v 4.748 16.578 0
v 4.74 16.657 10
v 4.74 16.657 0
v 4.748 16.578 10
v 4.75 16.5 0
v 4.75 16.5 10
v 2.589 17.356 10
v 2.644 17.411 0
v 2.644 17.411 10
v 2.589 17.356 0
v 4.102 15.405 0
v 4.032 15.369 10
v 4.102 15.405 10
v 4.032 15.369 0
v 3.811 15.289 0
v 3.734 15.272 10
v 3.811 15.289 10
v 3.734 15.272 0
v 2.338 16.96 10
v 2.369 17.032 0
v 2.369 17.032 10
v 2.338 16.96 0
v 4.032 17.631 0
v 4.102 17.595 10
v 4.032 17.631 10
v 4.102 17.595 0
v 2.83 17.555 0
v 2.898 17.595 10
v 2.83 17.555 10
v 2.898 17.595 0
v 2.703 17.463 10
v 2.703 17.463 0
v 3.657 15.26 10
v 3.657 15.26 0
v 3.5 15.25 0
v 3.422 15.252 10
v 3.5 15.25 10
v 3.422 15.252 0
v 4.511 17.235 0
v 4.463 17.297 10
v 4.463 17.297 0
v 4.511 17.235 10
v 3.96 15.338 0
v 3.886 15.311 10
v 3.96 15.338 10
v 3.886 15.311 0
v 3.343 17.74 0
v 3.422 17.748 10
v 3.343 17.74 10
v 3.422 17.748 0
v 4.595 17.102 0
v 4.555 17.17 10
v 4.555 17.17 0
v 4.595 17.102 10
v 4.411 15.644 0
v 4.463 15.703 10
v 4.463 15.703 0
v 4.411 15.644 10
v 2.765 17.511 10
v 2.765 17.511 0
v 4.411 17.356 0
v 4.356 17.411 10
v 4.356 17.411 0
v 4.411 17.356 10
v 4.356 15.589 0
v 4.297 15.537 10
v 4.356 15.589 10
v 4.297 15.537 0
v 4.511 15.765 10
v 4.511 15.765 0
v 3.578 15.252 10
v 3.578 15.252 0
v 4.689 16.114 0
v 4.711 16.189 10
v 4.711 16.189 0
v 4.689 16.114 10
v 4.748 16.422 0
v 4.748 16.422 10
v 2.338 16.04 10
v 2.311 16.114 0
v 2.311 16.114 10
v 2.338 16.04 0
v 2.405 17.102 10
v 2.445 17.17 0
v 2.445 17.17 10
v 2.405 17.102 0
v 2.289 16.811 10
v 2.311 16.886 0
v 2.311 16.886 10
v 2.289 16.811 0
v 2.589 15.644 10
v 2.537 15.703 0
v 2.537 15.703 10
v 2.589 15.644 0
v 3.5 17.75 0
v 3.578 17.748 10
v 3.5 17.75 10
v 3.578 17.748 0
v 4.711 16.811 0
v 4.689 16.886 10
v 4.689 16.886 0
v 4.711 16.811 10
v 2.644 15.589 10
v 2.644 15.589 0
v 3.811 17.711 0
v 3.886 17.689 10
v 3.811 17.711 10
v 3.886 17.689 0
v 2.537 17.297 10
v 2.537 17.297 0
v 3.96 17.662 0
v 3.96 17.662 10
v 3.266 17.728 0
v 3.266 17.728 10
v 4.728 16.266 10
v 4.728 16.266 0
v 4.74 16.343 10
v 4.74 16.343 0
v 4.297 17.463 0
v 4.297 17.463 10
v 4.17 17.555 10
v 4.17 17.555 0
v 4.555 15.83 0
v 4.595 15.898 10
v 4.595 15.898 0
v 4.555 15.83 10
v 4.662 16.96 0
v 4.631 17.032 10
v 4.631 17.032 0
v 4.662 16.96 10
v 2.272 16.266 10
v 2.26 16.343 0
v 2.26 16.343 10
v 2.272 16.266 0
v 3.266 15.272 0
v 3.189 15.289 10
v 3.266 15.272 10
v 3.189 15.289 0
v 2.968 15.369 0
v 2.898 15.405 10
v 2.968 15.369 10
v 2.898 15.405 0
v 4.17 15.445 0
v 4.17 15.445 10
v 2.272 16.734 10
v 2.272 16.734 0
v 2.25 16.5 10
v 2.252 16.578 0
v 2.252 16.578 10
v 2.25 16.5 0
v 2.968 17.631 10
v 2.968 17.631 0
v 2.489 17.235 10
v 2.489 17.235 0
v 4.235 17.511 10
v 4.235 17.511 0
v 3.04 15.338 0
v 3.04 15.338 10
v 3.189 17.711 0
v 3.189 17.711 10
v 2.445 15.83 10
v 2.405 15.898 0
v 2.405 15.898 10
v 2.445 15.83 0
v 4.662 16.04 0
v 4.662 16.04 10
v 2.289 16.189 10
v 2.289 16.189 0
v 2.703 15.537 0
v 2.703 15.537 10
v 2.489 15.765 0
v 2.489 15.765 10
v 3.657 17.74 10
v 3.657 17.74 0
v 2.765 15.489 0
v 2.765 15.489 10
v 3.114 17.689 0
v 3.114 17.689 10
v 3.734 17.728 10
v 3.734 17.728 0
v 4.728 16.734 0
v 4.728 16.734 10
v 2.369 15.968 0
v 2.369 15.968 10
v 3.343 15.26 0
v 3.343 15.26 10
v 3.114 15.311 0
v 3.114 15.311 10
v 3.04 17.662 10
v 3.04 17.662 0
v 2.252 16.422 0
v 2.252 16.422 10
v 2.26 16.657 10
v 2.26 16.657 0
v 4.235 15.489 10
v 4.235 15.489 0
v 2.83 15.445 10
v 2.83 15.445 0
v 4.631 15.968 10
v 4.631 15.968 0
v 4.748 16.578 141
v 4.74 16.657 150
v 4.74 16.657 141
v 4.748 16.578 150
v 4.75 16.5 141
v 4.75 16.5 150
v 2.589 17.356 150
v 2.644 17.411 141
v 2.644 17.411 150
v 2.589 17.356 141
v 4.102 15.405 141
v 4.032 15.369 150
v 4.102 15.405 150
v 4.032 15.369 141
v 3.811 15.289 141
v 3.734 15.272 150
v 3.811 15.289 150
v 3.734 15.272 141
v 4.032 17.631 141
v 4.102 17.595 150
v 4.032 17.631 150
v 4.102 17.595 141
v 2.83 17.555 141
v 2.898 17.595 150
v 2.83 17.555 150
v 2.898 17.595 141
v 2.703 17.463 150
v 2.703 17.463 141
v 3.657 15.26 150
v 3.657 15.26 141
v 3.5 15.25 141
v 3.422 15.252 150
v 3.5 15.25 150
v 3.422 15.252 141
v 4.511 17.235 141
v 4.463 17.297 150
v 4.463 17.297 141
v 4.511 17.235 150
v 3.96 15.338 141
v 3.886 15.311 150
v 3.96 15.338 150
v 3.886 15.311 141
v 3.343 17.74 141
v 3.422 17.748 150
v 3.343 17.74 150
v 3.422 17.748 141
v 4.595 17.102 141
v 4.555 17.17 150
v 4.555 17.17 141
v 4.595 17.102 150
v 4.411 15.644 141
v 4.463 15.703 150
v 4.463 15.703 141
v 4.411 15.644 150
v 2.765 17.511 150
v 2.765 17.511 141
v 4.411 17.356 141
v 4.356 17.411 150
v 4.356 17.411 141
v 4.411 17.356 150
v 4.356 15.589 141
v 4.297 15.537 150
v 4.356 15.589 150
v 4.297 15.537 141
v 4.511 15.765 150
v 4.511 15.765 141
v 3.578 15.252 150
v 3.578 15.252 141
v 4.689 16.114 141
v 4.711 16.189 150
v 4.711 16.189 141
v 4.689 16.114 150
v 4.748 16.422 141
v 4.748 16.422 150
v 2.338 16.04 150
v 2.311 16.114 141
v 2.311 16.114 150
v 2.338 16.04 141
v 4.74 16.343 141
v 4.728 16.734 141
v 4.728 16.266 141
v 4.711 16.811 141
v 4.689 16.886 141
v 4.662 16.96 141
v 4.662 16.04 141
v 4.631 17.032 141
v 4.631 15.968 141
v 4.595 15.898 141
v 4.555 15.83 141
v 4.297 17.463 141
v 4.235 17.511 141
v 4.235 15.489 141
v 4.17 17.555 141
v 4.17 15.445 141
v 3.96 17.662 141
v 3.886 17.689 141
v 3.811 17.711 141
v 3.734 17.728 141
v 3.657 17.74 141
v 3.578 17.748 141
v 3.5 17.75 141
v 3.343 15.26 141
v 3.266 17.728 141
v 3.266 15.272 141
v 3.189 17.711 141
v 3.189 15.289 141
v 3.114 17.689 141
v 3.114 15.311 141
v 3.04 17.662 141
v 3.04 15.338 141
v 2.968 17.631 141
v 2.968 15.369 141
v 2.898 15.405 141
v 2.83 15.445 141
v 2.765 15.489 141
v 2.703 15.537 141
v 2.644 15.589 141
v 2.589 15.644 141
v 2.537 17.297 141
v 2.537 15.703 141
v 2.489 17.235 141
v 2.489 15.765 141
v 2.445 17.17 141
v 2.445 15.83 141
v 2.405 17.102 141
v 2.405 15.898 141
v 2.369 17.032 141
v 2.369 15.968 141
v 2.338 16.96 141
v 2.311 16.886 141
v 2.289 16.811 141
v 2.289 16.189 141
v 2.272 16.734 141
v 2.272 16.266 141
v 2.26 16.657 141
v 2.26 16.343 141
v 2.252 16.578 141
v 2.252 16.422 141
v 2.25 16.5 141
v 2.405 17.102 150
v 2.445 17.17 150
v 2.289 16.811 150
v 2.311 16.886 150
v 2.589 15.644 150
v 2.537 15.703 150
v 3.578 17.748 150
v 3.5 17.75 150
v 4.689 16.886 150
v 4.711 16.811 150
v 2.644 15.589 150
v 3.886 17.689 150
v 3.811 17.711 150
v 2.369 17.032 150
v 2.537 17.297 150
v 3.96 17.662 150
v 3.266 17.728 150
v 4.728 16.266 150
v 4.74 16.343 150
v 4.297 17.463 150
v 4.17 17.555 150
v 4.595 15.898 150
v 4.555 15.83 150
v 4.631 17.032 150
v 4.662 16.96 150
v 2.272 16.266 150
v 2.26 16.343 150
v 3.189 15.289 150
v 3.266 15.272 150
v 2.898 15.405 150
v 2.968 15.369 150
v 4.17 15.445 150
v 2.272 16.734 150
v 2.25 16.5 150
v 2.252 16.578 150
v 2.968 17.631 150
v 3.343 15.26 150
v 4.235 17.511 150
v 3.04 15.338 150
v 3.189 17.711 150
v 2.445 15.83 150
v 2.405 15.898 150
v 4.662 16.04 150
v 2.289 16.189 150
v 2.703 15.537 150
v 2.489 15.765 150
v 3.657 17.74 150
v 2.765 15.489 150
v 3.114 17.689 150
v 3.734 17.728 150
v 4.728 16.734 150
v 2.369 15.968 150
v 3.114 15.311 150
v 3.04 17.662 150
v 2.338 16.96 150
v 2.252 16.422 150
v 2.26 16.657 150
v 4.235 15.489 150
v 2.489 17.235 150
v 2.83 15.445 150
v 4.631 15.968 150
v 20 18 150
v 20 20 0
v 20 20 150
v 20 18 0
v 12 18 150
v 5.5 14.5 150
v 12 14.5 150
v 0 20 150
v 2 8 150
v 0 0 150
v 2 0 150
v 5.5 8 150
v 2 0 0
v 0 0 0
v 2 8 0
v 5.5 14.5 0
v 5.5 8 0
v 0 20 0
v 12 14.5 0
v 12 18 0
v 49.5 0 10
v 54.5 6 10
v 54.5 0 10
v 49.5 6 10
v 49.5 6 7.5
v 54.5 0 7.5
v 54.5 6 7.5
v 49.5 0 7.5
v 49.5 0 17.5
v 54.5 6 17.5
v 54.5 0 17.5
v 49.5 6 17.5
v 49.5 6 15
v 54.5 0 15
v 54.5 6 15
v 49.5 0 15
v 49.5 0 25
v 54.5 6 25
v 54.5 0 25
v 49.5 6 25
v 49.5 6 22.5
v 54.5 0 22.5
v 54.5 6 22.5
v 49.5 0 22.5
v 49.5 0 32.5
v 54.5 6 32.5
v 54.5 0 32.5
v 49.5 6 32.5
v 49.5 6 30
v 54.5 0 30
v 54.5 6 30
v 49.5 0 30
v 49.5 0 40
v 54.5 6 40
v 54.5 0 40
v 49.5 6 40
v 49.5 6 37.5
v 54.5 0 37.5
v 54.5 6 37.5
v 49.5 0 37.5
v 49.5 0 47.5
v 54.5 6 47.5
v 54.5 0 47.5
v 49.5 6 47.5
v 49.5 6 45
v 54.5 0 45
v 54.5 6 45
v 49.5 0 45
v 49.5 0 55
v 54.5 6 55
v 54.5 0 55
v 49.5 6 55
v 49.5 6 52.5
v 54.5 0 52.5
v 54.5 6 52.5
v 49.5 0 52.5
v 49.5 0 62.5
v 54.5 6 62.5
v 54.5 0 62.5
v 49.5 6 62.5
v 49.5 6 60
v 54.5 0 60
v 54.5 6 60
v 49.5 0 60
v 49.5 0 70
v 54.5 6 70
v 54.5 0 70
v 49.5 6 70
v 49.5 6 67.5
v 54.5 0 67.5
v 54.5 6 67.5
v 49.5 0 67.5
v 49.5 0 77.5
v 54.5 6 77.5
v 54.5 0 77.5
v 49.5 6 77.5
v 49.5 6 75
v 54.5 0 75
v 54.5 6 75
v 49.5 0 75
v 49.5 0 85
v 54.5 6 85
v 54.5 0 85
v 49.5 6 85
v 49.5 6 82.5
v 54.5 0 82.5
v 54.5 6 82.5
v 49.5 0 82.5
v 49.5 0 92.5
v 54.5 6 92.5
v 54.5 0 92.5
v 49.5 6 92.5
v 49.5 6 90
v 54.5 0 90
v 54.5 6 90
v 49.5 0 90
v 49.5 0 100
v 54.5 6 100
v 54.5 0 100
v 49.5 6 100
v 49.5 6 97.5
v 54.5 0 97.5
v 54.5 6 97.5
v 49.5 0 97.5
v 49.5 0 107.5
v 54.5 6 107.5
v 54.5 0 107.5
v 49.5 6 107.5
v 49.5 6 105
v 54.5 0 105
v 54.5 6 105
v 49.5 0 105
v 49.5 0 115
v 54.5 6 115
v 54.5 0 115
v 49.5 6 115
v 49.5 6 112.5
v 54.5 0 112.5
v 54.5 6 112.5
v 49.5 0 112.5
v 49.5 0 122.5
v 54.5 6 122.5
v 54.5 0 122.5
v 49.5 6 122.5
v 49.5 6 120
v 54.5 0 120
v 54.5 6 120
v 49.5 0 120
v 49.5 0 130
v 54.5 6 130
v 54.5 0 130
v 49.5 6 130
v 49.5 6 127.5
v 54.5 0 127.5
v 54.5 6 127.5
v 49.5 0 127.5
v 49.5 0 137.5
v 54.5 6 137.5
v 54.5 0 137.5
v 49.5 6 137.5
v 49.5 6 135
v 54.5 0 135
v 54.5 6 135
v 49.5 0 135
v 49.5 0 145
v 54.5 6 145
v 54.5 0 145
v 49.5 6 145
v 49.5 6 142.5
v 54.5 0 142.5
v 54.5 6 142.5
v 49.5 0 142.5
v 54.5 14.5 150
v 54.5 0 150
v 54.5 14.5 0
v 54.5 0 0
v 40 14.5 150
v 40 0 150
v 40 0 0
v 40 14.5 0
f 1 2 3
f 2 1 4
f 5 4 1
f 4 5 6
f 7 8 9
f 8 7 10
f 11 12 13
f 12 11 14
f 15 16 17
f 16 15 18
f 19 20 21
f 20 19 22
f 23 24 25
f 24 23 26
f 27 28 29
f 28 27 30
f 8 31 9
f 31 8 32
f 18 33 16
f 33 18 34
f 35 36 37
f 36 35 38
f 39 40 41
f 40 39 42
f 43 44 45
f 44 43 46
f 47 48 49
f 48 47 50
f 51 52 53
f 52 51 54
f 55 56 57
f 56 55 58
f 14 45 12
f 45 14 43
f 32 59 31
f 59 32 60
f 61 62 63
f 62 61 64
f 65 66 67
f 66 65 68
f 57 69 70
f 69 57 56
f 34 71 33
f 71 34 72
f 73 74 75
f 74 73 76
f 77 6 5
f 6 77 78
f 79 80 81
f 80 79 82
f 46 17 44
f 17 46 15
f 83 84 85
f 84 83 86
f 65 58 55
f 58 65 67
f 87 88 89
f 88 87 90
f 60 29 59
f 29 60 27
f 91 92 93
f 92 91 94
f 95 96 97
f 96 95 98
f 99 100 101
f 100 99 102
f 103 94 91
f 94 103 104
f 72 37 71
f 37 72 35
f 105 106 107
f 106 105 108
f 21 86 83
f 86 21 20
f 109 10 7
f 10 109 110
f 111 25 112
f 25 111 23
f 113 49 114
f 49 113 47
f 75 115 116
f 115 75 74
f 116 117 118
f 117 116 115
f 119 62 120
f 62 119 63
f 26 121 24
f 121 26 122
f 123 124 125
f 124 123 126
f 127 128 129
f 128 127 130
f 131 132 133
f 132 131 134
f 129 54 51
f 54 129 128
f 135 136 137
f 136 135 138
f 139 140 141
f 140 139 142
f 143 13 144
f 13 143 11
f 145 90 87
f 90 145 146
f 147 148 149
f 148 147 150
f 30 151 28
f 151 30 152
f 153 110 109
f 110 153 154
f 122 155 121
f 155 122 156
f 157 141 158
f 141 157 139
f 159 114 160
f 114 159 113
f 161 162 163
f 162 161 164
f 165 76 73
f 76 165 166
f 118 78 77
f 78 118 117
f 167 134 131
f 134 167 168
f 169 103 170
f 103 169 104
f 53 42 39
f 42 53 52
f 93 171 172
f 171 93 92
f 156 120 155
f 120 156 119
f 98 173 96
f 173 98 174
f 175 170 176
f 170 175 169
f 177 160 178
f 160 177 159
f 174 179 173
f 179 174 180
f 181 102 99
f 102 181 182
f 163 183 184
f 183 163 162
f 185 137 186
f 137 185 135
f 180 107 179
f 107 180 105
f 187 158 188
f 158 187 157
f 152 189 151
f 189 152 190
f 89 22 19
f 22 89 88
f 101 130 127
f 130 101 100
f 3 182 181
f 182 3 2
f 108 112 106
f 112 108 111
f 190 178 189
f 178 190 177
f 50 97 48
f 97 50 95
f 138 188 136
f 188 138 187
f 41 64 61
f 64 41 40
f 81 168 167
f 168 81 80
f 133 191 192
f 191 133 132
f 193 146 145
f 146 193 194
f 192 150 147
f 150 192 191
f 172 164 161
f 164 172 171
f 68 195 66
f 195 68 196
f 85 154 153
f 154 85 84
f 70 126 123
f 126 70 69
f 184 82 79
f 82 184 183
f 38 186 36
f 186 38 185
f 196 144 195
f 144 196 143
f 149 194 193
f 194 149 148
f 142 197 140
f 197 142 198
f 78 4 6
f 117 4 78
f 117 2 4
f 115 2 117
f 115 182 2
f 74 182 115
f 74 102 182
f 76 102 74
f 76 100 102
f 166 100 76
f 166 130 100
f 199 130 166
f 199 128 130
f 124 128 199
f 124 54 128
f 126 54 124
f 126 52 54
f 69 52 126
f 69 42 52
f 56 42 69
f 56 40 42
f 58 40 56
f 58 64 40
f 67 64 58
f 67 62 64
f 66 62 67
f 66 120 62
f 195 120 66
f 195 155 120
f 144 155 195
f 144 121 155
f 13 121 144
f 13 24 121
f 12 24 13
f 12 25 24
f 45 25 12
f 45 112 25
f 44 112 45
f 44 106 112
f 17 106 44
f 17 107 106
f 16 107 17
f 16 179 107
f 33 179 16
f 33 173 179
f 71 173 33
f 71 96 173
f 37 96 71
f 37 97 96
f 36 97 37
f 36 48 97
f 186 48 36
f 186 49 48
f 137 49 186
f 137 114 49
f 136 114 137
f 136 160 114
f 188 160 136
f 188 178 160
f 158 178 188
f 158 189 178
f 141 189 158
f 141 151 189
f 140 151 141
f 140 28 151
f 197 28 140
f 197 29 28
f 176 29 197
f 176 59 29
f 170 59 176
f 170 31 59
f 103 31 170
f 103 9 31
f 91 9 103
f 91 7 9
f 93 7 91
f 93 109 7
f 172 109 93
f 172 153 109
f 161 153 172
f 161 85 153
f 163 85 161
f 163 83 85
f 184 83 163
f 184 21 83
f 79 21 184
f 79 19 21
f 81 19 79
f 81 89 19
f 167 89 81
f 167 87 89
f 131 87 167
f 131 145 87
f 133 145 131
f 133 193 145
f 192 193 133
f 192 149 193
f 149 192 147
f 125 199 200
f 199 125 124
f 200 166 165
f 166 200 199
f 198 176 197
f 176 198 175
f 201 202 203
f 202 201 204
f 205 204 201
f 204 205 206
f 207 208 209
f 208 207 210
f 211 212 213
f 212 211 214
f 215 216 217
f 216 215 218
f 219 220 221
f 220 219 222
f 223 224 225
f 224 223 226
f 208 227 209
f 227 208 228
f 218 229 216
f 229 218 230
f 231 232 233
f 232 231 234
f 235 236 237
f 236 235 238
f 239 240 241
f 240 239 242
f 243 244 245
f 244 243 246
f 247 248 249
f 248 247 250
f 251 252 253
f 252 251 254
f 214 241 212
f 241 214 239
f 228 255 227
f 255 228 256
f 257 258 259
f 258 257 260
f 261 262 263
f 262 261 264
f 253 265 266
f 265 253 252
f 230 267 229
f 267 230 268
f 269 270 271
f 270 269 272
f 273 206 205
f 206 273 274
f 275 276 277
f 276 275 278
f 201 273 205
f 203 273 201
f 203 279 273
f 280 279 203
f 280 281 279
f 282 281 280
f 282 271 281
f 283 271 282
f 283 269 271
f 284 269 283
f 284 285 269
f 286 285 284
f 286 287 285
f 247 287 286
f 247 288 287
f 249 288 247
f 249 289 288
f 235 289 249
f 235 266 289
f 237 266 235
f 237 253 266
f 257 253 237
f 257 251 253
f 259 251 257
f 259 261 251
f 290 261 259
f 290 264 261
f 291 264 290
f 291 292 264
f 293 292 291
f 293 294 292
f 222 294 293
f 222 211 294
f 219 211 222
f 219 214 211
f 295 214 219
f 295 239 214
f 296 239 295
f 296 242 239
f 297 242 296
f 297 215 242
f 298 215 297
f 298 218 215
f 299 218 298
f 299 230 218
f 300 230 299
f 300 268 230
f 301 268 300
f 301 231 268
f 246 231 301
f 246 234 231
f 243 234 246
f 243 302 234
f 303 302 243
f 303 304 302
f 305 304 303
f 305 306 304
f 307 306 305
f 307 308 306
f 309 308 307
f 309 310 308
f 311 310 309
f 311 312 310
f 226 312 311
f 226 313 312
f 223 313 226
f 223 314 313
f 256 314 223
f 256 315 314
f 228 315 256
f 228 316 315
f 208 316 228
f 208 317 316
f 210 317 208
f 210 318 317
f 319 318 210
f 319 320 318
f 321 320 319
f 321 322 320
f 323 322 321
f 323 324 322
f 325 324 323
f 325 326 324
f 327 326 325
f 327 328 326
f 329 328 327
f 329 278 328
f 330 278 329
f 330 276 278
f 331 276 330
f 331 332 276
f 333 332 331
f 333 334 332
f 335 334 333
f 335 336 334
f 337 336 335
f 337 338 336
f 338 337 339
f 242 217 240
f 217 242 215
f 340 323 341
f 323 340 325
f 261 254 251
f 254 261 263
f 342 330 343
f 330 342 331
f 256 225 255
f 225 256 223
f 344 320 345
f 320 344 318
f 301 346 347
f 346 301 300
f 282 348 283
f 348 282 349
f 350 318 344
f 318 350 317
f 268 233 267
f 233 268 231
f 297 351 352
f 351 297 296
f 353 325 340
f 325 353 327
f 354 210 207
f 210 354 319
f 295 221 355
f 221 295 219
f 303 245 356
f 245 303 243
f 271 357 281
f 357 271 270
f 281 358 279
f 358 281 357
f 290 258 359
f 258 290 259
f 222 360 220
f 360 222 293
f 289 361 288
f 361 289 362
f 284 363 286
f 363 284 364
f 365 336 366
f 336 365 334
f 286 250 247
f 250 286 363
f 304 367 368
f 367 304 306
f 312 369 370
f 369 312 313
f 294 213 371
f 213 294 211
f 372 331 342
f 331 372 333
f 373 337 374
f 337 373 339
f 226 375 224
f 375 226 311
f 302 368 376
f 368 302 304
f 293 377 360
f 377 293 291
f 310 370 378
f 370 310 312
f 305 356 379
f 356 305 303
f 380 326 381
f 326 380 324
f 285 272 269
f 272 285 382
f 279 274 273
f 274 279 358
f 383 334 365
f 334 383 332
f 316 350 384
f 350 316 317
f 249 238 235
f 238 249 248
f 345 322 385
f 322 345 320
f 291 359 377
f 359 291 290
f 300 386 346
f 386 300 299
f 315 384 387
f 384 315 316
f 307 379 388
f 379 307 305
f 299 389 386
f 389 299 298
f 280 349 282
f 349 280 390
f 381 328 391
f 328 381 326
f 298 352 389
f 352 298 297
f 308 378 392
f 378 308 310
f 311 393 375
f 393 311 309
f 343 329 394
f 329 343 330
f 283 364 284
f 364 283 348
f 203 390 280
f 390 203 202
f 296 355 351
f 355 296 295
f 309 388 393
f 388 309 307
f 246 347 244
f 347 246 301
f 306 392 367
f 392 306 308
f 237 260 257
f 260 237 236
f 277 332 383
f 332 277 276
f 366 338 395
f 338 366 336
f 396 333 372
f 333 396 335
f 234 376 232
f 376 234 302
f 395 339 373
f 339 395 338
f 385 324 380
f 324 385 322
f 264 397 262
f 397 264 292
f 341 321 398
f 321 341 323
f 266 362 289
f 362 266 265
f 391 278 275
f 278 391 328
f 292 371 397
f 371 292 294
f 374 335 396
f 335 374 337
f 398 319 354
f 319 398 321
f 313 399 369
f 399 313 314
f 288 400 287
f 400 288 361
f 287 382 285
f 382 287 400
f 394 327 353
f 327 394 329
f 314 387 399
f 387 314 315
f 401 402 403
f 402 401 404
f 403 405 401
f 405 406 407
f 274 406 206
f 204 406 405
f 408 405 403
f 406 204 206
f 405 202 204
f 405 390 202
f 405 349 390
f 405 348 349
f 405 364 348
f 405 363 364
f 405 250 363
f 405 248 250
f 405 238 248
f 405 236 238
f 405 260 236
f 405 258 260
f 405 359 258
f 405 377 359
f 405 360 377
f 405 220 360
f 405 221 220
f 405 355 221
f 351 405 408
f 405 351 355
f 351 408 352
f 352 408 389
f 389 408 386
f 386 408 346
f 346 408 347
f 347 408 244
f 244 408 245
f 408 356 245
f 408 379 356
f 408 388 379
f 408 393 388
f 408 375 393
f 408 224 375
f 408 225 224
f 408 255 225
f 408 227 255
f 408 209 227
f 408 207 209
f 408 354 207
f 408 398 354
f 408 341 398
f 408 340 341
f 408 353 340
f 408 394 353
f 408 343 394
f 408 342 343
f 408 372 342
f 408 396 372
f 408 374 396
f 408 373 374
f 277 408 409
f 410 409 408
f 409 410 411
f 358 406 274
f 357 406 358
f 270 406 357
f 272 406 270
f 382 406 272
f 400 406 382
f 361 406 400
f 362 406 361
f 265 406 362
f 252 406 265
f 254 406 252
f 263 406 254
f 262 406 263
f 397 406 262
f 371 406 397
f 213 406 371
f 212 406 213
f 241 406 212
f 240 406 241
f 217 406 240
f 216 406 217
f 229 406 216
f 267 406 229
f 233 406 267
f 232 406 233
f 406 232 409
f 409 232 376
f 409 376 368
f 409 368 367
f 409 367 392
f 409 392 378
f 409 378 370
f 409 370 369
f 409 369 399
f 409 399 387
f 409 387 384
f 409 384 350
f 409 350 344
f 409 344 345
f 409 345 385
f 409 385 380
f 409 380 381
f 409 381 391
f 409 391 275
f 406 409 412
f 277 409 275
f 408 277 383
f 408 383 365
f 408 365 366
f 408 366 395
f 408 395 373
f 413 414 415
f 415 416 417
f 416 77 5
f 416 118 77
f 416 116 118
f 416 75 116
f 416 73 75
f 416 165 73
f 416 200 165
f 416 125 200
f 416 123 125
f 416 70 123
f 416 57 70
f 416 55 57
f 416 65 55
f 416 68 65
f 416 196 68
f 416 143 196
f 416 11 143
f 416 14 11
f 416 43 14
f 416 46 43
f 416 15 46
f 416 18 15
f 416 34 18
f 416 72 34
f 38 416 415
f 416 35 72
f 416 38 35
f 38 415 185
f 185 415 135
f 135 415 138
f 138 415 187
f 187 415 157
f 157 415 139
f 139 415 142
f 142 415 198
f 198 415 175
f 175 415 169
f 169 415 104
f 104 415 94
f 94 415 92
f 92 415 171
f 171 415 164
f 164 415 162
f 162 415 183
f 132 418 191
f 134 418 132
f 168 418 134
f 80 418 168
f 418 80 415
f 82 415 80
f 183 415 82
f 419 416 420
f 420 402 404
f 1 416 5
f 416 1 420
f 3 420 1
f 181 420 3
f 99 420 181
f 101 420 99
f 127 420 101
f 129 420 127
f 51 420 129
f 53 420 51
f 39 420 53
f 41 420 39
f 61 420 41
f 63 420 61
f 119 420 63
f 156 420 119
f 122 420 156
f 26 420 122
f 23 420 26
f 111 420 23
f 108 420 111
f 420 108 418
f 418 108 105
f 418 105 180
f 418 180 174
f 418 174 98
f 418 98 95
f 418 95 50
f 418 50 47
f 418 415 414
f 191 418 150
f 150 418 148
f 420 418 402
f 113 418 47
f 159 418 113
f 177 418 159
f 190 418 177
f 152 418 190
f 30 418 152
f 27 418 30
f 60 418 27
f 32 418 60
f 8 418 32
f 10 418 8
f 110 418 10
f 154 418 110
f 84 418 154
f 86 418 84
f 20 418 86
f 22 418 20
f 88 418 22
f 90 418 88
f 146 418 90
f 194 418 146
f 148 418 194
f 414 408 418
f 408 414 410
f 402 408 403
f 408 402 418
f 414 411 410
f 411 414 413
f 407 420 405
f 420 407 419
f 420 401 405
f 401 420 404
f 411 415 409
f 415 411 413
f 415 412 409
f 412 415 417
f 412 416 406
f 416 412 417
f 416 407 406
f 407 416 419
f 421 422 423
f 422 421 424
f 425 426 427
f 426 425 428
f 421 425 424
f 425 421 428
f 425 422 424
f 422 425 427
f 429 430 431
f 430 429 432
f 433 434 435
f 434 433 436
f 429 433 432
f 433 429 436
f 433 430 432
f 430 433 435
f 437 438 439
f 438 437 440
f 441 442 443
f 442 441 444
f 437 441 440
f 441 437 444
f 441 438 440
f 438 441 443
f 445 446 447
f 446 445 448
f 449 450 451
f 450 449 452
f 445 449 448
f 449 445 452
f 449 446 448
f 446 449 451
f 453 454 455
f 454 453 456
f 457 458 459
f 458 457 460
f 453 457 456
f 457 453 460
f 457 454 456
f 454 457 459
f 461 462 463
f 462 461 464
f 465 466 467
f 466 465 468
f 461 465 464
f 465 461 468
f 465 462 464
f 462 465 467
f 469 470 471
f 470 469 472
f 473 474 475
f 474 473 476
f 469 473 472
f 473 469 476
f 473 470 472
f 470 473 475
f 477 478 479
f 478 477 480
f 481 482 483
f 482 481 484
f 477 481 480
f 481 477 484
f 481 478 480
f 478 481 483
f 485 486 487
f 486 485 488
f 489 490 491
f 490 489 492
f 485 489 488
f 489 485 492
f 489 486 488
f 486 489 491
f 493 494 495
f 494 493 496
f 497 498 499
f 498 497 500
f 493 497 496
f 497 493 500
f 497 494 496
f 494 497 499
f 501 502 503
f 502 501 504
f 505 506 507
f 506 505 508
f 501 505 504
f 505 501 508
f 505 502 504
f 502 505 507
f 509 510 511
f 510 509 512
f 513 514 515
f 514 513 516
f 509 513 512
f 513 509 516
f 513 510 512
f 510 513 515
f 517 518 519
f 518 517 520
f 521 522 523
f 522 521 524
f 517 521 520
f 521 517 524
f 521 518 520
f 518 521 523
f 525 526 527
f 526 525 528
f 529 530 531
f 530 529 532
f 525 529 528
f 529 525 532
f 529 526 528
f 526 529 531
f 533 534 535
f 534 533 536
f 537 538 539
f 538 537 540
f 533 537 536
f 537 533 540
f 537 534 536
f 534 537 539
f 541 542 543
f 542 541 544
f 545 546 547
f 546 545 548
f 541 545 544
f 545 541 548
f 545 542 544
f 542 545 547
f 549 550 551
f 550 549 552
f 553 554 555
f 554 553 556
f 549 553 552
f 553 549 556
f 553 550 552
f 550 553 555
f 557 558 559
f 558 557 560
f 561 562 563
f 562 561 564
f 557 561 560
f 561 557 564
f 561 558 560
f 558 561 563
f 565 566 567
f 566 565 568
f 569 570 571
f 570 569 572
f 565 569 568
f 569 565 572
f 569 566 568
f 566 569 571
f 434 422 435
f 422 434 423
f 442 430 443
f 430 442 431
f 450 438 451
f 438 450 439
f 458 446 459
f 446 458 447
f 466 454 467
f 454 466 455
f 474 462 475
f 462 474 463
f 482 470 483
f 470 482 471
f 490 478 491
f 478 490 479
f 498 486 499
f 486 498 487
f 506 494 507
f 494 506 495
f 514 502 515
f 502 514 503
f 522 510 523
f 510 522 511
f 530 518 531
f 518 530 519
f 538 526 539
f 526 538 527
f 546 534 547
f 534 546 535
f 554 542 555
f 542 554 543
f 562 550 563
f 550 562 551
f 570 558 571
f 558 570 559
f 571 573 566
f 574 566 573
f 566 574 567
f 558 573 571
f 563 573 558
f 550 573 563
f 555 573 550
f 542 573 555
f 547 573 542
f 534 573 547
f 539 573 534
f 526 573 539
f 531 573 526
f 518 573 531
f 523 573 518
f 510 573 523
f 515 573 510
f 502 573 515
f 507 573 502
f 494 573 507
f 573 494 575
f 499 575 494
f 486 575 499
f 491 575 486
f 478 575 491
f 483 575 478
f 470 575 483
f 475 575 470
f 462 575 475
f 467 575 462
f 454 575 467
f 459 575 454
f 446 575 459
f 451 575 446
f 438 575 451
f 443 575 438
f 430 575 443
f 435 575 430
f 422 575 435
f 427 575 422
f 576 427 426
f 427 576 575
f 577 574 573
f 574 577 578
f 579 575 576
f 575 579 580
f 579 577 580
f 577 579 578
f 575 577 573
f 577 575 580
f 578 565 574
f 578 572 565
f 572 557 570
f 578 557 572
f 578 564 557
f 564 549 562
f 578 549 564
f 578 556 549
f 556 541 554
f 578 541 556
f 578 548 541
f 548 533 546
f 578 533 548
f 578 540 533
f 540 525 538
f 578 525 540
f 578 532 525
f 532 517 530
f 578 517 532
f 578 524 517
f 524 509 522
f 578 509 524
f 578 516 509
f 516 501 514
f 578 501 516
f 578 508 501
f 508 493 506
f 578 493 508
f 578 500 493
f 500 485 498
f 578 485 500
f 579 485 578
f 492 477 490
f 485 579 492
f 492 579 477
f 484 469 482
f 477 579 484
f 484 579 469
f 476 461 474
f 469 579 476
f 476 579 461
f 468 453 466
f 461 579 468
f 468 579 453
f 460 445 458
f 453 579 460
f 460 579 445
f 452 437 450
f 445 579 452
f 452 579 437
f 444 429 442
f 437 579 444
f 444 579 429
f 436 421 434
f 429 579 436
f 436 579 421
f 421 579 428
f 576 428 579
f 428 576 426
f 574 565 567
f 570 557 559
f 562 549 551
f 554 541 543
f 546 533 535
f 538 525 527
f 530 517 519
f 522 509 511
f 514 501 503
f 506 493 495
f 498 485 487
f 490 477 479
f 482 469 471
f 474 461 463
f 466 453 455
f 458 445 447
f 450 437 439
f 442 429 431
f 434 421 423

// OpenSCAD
widthX = 20;

widthY = 20;

height = 150;

wallWidth = 3;

traySeparator = 7.5;

difference() {

    cube([widthX, widthY, height]);

    translate([(widthX - wallWidth - 5), (widthY - wallWidth - 3.5), -1]) {
        cube([wallWidth + 6, wallWidth + 1.5, height + 2]);
    }

    translate([2, -1, -1]) {
        cube([wallWidth + 1.5, wallWidth + 6, height + 2]);
    }
    
    translate([wallWidth + 2.5, -1, -1]) {
        cube([(widthX - wallWidth - 1.5), (widthY - wallWidth - 1.5), height + 2]);
    }

    // Join holes
    translate([3.5 , widthY - 3.5, -1]) {
        cylinder(r=1.25, h=11, $fn=100);
        translate([0, 0, height - 8]){
            cylinder(r=1.25, h=11, $fn=100);
        }
    }

}



translate([(widthX + 20), 0, 0]) {

    localWidth = widthX - wallWidth - 2.5;

    difference() {
        cube([localWidth, (widthY - wallWidth - 2.5), height]);

        for (currentHeight=[traySeparator:traySeparator:height]) {
            if (currentHeight < height) {
                translate([0, 0, currentHeight]){
                    makeSupportJoin(localWidth);
                }
            }
        }
    }
}

module makeSupportJoin(width) {
    translate([width - 5, -1, 0]) {
        cube([7, 7, 2.5]);
    }
}
